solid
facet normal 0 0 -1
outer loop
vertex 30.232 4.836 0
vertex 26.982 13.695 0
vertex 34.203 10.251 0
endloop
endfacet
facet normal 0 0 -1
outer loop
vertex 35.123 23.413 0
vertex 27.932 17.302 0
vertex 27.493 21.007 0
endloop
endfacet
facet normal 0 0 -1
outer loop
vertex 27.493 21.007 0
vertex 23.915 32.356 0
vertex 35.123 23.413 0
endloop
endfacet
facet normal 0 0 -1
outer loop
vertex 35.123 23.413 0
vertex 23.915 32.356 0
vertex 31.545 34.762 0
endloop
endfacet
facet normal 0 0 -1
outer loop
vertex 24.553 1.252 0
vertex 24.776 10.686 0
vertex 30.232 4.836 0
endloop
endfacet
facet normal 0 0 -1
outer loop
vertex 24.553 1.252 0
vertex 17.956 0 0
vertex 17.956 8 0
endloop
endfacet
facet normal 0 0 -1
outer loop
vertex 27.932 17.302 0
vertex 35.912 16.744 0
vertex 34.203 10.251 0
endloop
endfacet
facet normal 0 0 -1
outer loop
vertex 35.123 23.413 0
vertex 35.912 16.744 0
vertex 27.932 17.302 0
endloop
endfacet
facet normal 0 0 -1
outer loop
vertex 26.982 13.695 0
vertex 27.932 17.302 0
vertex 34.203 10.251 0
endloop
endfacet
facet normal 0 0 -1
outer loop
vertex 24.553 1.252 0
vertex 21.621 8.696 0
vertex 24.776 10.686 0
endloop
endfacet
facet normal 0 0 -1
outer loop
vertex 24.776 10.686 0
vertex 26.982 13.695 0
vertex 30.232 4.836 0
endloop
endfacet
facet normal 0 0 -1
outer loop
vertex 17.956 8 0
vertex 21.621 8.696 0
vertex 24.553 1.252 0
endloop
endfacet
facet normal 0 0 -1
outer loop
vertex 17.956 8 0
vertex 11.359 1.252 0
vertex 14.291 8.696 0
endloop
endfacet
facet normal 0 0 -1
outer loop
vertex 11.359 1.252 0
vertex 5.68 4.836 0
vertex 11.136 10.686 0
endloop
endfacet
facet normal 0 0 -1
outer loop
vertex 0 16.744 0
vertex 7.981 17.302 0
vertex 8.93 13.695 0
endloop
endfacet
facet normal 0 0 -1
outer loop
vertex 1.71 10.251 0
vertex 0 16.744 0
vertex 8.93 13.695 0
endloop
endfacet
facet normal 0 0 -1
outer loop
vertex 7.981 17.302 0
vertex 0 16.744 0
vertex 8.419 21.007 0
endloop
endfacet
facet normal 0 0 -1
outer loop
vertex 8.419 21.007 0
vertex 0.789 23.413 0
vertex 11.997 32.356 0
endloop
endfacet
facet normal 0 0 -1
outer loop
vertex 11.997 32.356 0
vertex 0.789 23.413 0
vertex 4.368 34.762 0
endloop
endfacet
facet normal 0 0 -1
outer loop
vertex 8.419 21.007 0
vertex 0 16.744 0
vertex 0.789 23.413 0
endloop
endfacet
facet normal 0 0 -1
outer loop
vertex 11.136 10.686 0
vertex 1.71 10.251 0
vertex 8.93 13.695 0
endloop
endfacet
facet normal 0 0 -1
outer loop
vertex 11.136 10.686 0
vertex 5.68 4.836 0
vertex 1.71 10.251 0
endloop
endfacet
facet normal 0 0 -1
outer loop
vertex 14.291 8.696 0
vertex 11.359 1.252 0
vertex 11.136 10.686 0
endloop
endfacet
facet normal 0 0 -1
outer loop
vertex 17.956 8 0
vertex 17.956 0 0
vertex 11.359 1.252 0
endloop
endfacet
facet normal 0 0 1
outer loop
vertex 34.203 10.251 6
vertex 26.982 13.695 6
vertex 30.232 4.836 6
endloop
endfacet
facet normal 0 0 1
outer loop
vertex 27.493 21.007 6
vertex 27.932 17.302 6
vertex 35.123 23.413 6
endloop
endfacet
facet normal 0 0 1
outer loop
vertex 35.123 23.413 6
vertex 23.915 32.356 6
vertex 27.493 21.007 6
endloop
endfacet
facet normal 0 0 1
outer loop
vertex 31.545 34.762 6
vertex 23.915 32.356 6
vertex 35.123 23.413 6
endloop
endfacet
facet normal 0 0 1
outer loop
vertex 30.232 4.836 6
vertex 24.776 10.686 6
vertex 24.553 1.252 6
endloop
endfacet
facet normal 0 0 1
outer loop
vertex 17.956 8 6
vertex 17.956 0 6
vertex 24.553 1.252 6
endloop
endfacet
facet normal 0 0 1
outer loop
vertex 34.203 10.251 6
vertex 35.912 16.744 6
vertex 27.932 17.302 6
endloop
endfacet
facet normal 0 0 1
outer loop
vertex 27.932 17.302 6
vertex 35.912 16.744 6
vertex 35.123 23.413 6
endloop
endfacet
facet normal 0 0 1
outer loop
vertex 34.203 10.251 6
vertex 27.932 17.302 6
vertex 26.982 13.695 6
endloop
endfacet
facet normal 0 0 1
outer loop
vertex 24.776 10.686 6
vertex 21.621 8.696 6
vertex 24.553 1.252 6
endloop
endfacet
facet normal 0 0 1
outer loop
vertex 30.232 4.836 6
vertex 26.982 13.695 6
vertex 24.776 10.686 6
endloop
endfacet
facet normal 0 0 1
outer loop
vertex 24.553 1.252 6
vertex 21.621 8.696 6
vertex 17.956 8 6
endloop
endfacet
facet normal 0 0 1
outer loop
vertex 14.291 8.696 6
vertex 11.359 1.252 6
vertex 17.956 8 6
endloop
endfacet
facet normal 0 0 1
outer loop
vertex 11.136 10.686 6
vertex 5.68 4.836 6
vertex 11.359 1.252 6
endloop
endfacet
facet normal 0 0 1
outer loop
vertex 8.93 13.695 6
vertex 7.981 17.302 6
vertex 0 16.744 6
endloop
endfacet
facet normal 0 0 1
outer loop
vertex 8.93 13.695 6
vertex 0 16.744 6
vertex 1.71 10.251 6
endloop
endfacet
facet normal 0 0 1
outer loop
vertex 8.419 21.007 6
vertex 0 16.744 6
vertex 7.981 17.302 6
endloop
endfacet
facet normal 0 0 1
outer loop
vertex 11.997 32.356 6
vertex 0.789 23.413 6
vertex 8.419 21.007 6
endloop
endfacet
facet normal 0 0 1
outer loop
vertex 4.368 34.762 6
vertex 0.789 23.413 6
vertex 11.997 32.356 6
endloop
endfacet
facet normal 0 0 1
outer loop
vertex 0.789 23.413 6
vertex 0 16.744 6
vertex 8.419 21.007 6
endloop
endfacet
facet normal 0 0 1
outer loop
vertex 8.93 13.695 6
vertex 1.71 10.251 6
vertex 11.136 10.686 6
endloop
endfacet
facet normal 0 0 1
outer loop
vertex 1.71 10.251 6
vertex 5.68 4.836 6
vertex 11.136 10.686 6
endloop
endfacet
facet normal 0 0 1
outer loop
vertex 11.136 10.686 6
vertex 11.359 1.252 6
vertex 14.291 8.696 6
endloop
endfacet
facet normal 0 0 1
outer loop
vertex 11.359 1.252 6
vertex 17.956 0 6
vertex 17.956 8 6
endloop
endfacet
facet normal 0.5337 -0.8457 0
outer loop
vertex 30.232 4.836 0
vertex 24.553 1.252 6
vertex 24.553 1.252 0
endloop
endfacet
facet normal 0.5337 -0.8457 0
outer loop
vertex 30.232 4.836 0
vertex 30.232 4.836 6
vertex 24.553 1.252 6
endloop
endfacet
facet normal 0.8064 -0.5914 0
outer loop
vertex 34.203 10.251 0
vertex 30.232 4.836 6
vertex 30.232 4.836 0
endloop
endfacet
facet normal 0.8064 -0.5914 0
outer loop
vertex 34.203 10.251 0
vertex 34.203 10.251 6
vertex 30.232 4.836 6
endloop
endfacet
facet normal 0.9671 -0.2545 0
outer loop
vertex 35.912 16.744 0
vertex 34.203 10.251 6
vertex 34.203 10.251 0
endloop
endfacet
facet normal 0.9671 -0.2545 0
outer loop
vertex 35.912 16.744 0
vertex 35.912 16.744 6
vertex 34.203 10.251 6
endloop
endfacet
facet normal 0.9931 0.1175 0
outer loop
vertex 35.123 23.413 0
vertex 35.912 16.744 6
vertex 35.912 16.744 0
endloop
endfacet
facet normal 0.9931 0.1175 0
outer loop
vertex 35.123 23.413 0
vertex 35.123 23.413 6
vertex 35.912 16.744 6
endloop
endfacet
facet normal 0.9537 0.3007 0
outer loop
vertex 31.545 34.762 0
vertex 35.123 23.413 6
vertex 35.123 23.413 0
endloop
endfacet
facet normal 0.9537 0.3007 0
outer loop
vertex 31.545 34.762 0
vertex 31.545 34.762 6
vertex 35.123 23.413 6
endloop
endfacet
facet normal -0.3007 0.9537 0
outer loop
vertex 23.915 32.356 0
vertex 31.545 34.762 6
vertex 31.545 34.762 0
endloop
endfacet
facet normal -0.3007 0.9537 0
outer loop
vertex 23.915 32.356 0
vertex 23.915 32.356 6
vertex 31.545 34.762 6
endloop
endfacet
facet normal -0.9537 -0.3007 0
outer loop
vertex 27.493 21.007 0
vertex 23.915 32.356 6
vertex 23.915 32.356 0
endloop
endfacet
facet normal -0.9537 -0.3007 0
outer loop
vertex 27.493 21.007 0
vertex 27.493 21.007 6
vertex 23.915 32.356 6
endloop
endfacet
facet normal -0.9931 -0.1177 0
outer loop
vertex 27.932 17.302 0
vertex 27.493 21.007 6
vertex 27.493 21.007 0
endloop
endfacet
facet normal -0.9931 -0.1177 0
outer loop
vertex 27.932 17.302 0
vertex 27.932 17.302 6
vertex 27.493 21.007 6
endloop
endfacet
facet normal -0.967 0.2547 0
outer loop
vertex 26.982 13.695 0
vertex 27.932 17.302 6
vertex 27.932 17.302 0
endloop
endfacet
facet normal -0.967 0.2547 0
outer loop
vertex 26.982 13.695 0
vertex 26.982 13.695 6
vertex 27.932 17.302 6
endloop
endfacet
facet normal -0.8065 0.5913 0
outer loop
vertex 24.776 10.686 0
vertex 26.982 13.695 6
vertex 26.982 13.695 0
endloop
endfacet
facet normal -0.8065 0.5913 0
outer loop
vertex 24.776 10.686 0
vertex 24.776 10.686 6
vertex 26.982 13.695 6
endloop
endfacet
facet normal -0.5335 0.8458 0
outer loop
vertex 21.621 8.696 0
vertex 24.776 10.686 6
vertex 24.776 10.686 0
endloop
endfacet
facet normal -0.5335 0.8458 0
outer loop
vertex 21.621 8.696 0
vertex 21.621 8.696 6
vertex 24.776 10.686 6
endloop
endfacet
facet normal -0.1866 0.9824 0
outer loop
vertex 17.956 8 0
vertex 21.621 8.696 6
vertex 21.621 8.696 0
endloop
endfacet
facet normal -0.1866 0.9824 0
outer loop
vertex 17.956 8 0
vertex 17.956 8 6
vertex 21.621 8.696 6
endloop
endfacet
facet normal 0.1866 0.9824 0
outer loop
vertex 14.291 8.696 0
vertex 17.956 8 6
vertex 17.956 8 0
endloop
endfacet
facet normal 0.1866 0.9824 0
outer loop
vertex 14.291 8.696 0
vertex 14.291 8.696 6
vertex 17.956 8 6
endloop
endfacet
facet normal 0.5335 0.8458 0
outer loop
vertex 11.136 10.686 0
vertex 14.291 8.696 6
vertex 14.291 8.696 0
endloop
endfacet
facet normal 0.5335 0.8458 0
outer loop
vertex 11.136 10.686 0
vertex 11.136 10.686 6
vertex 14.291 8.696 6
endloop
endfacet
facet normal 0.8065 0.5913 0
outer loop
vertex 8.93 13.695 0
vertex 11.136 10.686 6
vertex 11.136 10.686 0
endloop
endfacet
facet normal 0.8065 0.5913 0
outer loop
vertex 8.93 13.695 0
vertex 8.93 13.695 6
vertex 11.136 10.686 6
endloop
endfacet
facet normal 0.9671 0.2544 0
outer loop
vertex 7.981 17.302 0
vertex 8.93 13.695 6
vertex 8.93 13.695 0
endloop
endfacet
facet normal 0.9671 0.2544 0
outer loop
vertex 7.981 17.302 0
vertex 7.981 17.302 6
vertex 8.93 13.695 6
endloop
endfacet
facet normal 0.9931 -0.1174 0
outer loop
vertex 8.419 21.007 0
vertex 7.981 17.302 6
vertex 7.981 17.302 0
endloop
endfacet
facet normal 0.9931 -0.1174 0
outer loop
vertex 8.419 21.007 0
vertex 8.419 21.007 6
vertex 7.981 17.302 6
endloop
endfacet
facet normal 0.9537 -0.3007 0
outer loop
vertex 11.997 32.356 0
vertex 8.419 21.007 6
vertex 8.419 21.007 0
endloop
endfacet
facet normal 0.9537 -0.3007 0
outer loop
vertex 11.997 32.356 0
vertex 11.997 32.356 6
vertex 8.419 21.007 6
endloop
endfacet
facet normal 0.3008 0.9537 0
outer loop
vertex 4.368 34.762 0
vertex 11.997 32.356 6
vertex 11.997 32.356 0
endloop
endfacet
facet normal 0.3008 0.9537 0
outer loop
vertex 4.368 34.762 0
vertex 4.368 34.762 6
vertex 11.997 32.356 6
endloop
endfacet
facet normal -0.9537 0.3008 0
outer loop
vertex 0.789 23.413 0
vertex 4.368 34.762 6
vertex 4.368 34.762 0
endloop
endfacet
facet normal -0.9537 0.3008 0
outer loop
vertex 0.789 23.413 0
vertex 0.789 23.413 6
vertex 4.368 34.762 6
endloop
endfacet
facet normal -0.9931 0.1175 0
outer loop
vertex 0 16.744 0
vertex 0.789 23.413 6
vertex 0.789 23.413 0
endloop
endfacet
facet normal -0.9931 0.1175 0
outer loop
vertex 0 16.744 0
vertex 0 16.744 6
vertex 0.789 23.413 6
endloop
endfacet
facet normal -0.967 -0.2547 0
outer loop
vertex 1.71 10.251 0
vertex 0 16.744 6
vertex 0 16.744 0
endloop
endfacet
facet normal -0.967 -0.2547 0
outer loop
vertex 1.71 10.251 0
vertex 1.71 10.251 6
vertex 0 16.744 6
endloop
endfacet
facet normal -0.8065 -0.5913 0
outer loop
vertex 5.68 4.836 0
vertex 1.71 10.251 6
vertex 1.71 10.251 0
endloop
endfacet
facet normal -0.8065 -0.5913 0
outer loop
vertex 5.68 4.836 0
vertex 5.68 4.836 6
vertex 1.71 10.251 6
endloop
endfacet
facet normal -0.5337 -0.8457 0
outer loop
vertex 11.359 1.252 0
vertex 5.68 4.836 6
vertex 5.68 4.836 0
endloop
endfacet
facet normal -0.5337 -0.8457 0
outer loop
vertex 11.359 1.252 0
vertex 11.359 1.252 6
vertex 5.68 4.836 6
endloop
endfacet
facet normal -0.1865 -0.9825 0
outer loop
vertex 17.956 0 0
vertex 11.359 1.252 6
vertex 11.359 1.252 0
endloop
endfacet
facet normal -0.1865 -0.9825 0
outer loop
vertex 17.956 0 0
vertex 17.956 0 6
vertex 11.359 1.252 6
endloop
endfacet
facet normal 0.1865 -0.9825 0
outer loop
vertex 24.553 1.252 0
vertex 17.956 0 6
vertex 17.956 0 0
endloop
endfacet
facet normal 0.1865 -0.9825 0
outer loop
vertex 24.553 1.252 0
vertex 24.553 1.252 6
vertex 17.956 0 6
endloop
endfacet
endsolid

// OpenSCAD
$fn = 32;

// ----------------------------------------------------------------------
// Clip blank: omega clip, 6 mm thick
// ----------------------------------------------------------------------

// --- parameters (mm) ---
profile_height = 6;       // extrusion height
profile_points = 26;      // points of the closed outline

profile = [[0.789, 23.413], [0, 16.744], [1.71, 10.251], [5.68, 4.836], [11.359, 1.252], [17.956, 0], [24.553, 1.252], [30.232, 4.836], [34.203, 10.251], [35.912, 16.744], [35.123, 23.413], [31.545, 34.762], [23.915, 32.356], [27.493, 21.007], [27.932, 17.302], [26.982, 13.695], [24.776, 10.686], [21.621, 8.696], [17.956, 8], [14.291, 8.696], [11.136, 10.686], [8.93, 13.695], [7.981, 17.302], [8.419, 21.007], [11.997, 32.356], [4.368, 34.762]];  // single closed polygon, 26 points, counter clockwise

// --- the one profile operation ---
linear_extrude(height = profile_height) polygon(points = profile);
